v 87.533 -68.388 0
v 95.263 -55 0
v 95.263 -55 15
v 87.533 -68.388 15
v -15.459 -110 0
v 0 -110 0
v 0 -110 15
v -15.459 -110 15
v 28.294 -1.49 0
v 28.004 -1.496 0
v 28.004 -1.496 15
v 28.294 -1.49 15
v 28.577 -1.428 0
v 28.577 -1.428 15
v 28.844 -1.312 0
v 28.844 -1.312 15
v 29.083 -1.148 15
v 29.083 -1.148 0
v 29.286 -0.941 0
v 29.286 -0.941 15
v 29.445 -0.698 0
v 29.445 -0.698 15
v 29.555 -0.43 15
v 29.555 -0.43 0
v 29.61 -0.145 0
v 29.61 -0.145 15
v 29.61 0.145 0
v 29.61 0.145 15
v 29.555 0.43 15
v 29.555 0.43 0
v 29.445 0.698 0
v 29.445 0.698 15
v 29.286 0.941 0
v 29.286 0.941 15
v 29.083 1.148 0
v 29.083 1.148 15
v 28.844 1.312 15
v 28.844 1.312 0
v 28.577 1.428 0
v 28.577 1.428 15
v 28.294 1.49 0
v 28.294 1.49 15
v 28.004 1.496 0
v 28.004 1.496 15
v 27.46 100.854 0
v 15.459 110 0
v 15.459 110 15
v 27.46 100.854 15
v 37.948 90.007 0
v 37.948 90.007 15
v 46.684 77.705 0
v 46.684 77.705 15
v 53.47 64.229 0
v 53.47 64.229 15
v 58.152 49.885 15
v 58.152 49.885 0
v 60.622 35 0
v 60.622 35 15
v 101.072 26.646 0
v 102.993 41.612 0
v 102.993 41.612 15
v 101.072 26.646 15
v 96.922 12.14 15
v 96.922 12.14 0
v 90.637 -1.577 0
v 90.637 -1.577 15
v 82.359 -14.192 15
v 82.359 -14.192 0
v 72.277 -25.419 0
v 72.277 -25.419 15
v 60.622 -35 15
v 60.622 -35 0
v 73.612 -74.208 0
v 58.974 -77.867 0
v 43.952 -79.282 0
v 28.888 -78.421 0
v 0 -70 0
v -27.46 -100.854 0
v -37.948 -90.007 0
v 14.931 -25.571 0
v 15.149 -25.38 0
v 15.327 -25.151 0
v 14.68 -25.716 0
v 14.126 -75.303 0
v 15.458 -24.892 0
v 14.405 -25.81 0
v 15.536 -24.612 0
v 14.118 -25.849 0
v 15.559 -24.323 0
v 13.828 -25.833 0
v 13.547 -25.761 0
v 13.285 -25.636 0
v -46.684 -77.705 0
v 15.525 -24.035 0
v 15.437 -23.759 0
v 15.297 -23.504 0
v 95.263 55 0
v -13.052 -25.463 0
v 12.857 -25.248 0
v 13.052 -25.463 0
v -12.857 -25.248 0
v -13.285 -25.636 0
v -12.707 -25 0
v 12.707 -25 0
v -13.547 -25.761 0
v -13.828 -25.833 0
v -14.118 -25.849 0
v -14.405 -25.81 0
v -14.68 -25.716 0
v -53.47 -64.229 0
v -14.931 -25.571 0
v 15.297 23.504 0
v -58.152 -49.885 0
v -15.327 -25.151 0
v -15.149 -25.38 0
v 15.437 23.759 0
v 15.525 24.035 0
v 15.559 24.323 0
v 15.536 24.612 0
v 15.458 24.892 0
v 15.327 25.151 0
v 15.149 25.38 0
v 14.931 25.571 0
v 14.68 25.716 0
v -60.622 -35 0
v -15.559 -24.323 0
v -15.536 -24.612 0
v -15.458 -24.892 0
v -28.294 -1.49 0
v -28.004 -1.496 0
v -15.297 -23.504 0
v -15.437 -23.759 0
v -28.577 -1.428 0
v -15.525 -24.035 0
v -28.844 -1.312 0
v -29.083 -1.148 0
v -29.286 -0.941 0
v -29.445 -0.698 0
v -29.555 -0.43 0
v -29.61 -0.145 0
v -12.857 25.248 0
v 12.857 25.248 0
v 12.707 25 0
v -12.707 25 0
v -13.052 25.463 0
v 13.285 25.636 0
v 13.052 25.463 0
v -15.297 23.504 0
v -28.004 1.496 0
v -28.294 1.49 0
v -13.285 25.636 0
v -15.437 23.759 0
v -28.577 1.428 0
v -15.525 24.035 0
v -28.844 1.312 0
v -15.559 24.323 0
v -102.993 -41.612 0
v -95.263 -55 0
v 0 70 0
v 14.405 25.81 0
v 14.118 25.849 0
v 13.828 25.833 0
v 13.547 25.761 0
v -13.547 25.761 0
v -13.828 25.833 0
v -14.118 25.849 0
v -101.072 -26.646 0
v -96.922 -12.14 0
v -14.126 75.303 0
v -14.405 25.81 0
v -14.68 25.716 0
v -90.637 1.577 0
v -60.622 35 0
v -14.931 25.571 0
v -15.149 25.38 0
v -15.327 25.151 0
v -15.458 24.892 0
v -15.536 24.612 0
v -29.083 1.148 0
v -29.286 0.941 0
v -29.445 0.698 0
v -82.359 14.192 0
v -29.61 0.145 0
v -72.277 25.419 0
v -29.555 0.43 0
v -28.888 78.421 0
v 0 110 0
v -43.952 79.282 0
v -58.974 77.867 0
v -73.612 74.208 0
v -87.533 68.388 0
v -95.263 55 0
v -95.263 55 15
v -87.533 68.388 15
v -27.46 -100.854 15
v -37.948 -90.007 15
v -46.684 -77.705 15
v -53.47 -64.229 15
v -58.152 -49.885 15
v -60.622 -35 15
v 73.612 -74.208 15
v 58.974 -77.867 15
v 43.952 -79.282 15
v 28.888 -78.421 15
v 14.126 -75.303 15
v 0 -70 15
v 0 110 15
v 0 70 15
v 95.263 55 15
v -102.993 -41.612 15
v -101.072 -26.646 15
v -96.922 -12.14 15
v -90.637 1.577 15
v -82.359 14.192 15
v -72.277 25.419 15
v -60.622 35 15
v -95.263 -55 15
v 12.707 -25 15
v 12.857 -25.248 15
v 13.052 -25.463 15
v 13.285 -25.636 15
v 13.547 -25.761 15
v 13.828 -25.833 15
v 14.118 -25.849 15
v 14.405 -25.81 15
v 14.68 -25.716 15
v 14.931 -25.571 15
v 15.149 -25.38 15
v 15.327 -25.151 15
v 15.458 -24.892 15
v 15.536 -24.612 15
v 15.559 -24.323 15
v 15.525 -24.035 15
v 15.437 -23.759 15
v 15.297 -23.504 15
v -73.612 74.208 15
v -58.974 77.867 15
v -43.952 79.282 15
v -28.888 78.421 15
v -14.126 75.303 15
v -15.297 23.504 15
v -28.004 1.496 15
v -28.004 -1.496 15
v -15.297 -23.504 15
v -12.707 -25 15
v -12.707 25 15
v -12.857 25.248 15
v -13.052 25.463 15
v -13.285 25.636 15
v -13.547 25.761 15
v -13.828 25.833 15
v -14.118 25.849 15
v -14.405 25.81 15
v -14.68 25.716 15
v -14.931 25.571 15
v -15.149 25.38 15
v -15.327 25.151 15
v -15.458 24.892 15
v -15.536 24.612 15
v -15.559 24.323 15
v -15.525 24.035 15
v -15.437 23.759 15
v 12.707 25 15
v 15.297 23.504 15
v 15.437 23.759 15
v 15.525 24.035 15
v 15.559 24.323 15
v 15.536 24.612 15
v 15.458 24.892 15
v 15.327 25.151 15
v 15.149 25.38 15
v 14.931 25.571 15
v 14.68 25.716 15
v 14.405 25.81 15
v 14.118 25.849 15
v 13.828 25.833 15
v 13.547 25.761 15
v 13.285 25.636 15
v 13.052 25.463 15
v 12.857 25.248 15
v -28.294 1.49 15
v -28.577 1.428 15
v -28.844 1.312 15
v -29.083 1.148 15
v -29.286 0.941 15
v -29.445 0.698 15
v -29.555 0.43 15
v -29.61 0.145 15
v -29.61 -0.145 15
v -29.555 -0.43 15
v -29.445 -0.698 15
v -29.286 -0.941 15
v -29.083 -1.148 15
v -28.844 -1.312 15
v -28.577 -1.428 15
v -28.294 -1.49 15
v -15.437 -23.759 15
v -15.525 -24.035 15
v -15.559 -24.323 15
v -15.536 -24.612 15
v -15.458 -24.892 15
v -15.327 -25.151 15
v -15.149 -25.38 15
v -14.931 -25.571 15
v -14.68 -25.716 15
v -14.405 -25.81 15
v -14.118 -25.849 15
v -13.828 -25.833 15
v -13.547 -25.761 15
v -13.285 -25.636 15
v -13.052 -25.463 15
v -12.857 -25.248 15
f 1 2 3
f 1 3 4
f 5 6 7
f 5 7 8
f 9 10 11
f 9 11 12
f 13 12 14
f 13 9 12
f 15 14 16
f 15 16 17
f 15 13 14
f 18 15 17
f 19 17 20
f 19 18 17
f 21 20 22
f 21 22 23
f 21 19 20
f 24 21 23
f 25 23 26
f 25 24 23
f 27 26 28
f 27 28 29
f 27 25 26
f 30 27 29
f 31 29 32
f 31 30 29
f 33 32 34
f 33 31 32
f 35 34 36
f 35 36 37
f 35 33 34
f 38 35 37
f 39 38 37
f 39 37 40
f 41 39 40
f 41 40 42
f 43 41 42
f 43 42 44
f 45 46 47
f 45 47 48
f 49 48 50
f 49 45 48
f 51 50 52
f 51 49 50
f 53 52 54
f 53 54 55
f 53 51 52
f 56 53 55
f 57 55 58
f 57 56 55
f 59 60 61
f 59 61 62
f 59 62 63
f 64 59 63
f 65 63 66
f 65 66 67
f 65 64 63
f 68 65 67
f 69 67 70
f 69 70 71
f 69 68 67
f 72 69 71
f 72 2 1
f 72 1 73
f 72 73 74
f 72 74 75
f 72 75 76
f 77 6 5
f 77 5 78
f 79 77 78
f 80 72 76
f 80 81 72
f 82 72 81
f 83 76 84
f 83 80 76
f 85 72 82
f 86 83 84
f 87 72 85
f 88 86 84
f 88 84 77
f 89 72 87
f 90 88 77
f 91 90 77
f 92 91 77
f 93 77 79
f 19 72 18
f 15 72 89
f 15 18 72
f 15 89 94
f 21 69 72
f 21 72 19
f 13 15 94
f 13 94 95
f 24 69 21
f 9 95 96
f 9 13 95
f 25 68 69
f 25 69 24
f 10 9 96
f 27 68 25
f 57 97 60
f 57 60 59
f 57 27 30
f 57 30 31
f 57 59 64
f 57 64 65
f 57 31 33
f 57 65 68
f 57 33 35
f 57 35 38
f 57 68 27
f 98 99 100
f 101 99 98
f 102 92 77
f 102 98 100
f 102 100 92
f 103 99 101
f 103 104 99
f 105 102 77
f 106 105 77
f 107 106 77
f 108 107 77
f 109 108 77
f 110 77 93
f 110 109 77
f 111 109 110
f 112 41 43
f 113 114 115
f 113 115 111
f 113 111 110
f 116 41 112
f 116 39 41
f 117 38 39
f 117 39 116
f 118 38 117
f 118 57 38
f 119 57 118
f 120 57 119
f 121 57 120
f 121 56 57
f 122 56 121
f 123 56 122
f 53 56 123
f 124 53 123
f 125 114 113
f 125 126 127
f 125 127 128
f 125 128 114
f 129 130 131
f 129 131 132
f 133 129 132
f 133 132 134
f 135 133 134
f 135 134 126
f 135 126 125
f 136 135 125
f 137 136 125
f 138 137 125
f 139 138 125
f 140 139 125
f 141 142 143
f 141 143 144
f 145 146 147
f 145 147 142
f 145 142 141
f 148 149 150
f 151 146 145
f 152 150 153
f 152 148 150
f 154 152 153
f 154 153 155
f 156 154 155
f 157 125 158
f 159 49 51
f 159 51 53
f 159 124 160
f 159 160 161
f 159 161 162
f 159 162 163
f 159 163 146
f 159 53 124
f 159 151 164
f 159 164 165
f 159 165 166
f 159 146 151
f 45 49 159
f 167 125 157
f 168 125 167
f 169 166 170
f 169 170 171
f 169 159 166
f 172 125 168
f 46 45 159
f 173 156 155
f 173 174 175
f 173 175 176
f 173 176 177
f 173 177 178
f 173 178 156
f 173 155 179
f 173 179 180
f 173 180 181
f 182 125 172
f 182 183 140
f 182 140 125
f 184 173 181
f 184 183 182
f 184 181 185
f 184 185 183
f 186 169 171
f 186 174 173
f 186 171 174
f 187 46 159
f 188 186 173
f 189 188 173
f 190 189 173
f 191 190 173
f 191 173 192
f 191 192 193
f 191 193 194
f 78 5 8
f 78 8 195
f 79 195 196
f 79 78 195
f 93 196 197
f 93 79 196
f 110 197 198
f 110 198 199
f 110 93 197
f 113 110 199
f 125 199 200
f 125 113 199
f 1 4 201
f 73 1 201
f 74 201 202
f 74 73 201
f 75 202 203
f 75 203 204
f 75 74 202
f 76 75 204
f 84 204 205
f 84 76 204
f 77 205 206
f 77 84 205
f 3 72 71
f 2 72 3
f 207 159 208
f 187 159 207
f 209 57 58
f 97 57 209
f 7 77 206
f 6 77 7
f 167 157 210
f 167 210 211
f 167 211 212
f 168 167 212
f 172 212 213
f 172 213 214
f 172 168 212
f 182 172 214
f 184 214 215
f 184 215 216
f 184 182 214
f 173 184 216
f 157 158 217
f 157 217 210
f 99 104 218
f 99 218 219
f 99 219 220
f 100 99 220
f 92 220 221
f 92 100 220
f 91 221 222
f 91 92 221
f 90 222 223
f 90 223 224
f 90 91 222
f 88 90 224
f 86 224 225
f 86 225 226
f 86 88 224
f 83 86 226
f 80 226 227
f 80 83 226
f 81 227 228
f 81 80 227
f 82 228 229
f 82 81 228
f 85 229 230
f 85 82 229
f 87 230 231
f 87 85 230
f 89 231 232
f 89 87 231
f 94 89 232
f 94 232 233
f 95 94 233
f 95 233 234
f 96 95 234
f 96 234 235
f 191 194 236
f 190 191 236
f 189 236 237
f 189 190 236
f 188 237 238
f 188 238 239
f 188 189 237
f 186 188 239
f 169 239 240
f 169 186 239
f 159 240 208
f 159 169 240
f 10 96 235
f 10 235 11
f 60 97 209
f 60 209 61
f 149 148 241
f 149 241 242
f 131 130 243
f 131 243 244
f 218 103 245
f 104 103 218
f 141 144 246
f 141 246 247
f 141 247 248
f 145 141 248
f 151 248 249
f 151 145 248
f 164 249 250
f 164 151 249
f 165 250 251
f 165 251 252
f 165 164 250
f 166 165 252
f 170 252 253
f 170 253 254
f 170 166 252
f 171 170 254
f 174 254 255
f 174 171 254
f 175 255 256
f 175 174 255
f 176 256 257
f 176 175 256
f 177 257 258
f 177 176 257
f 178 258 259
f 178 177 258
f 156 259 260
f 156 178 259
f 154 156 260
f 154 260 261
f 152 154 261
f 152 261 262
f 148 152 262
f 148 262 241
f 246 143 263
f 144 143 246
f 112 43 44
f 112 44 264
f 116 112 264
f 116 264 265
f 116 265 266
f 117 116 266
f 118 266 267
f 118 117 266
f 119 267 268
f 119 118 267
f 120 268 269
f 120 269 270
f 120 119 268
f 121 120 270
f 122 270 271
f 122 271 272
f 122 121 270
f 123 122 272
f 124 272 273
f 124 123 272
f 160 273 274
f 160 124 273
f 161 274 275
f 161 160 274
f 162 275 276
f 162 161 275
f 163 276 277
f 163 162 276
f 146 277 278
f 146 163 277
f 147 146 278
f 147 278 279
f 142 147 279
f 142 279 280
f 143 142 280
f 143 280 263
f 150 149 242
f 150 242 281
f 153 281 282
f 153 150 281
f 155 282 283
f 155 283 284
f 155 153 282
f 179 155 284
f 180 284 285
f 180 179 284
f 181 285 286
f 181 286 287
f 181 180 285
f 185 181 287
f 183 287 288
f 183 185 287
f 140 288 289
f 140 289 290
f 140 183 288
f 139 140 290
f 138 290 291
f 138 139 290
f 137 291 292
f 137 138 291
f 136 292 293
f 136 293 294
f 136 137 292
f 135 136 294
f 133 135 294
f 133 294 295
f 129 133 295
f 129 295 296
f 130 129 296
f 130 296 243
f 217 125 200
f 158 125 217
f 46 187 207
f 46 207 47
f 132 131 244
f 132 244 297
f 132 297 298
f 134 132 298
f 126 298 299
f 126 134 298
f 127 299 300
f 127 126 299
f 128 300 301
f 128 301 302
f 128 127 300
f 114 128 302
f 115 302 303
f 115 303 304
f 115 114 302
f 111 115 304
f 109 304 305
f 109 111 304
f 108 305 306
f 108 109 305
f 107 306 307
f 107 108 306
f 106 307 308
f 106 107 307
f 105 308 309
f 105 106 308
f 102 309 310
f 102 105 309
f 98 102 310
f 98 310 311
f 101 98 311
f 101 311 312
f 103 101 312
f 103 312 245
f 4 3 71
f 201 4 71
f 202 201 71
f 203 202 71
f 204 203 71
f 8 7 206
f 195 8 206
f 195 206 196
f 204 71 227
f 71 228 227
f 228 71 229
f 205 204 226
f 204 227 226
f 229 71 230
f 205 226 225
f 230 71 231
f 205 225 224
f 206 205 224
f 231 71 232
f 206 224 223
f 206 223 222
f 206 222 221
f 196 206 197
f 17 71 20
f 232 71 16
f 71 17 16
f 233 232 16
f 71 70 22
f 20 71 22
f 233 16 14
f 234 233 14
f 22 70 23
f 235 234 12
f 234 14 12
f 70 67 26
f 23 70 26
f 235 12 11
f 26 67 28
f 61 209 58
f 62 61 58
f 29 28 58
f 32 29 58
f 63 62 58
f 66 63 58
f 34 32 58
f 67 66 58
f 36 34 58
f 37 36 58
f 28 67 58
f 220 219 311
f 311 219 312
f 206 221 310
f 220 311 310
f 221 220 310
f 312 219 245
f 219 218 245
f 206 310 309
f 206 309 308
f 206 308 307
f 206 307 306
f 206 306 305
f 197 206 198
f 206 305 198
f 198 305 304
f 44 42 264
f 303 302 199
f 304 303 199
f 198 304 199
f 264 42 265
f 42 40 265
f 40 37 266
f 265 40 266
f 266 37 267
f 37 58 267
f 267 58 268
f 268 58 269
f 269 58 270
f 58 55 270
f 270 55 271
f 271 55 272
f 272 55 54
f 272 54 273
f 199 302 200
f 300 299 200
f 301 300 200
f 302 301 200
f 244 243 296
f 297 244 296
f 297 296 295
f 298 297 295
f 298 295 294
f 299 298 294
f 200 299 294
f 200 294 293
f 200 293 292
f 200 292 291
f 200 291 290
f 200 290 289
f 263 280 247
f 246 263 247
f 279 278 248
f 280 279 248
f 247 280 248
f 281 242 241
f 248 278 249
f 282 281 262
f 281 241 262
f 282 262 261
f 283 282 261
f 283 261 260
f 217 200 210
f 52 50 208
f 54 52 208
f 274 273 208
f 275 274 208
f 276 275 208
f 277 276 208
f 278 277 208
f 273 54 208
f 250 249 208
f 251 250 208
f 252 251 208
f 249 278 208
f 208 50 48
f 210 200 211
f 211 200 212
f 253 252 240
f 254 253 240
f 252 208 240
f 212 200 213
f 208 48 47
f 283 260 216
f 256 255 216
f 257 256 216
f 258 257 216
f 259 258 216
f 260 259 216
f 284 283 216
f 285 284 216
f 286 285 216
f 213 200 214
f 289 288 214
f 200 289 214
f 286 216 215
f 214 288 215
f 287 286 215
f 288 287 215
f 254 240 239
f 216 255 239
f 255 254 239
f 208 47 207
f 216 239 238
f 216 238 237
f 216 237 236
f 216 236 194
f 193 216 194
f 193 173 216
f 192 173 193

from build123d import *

# Parameters (mm, degrees)
BOSS_EXTRUDE1_DEPTH = 15


with BuildPart() as part:
    # Sketch1 → Boss-Extrude1 (new body)
    with BuildSketch(Plane.XY):
        with BuildLine():
            Line((0, 70), (0, 110))
            Line((0, 110), (15.459491817, 110))
            ThreePointArc((15.459491817, 110), (46.684314733, 77.704911176), (60.621778265, 35))
            Line((60.621778265, 35), (95.262794416, 55))
            Line((95.262794416, 55), (102.992540325, 41.611687357))
            ThreePointArc((102.992540325, 41.611687357), (90.636584443, -1.577346929), (60.621778265, -35))
            Line((60.621778265, -35), (95.262794416, -55))
            Line((95.262794416, -55), (87.533048508, -68.388312643))
            ThreePointArc((87.533048508, -68.388312643), (43.952269711, -79.282258105), (0, -70))
            Line((0, -70), (0, -110))
            Line((0, -110), (-15.459491817, -110))
            ThreePointArc((-15.459491817, -110), (-46.684314733, -77.704911176), (-60.621778265, -35))
            Line((-60.621778265, -35), (-95.262794416, -55))
            Line((-95.262794416, -55), (-102.992540325, -41.611687357))
            ThreePointArc((-102.992540325, -41.611687357), (-90.636584443, 1.577346929), (-60.621778265, 35))
            Line((-60.621778265, 35), (-95.262794416, 55))
            Line((-95.262794416, 55), (-87.533048508, 68.388312643))
            ThreePointArc((-87.533048508, 68.388312643), (-43.952269711, 79.282258105), (0, 70))
        make_face()
        with BuildLine():
            Line((-28.003972595, -1.495696651), (-15.297297594, -23.504303349))
            ThreePointArc((-15.297297594, -23.504303349), (-14.80875673, -25.649519053), (-12.706675001, -25))
            Line((-12.706675001, -25), (12.706675001, -25))
            ThreePointArc((12.706675001, -25), (14.80875673, -25.649519053), (15.297297594, -23.504303349))
            Line((15.297297594, -23.504303349), (28.003972595, -1.495696651))
            ThreePointArc((28.003972595, -1.495696651), (29.617513459, 0), (28.003972595, 1.495696651))
            Line((28.003972595, 1.495696651), (15.297297594, 23.504303349))
            ThreePointArc((15.297297594, 23.504303349), (14.80875673, 25.649519053), (12.706675001, 25))
            Line((12.706675001, 25), (-12.706675001, 25))
            ThreePointArc((-12.706675001, 25), (-14.80875673, 25.649519053), (-15.297297594, 23.504303349))
            Line((-15.297297594, 23.504303349), (-28.003972595, 1.495696651))
            ThreePointArc((-28.003972595, 1.495696651), (-29.617513459, 0), (-28.003972595, -1.495696651))
        make_face(mode=Mode.SUBTRACT)
    extrude(amount=BOSS_EXTRUDE1_DEPTH)


solid = part.part
